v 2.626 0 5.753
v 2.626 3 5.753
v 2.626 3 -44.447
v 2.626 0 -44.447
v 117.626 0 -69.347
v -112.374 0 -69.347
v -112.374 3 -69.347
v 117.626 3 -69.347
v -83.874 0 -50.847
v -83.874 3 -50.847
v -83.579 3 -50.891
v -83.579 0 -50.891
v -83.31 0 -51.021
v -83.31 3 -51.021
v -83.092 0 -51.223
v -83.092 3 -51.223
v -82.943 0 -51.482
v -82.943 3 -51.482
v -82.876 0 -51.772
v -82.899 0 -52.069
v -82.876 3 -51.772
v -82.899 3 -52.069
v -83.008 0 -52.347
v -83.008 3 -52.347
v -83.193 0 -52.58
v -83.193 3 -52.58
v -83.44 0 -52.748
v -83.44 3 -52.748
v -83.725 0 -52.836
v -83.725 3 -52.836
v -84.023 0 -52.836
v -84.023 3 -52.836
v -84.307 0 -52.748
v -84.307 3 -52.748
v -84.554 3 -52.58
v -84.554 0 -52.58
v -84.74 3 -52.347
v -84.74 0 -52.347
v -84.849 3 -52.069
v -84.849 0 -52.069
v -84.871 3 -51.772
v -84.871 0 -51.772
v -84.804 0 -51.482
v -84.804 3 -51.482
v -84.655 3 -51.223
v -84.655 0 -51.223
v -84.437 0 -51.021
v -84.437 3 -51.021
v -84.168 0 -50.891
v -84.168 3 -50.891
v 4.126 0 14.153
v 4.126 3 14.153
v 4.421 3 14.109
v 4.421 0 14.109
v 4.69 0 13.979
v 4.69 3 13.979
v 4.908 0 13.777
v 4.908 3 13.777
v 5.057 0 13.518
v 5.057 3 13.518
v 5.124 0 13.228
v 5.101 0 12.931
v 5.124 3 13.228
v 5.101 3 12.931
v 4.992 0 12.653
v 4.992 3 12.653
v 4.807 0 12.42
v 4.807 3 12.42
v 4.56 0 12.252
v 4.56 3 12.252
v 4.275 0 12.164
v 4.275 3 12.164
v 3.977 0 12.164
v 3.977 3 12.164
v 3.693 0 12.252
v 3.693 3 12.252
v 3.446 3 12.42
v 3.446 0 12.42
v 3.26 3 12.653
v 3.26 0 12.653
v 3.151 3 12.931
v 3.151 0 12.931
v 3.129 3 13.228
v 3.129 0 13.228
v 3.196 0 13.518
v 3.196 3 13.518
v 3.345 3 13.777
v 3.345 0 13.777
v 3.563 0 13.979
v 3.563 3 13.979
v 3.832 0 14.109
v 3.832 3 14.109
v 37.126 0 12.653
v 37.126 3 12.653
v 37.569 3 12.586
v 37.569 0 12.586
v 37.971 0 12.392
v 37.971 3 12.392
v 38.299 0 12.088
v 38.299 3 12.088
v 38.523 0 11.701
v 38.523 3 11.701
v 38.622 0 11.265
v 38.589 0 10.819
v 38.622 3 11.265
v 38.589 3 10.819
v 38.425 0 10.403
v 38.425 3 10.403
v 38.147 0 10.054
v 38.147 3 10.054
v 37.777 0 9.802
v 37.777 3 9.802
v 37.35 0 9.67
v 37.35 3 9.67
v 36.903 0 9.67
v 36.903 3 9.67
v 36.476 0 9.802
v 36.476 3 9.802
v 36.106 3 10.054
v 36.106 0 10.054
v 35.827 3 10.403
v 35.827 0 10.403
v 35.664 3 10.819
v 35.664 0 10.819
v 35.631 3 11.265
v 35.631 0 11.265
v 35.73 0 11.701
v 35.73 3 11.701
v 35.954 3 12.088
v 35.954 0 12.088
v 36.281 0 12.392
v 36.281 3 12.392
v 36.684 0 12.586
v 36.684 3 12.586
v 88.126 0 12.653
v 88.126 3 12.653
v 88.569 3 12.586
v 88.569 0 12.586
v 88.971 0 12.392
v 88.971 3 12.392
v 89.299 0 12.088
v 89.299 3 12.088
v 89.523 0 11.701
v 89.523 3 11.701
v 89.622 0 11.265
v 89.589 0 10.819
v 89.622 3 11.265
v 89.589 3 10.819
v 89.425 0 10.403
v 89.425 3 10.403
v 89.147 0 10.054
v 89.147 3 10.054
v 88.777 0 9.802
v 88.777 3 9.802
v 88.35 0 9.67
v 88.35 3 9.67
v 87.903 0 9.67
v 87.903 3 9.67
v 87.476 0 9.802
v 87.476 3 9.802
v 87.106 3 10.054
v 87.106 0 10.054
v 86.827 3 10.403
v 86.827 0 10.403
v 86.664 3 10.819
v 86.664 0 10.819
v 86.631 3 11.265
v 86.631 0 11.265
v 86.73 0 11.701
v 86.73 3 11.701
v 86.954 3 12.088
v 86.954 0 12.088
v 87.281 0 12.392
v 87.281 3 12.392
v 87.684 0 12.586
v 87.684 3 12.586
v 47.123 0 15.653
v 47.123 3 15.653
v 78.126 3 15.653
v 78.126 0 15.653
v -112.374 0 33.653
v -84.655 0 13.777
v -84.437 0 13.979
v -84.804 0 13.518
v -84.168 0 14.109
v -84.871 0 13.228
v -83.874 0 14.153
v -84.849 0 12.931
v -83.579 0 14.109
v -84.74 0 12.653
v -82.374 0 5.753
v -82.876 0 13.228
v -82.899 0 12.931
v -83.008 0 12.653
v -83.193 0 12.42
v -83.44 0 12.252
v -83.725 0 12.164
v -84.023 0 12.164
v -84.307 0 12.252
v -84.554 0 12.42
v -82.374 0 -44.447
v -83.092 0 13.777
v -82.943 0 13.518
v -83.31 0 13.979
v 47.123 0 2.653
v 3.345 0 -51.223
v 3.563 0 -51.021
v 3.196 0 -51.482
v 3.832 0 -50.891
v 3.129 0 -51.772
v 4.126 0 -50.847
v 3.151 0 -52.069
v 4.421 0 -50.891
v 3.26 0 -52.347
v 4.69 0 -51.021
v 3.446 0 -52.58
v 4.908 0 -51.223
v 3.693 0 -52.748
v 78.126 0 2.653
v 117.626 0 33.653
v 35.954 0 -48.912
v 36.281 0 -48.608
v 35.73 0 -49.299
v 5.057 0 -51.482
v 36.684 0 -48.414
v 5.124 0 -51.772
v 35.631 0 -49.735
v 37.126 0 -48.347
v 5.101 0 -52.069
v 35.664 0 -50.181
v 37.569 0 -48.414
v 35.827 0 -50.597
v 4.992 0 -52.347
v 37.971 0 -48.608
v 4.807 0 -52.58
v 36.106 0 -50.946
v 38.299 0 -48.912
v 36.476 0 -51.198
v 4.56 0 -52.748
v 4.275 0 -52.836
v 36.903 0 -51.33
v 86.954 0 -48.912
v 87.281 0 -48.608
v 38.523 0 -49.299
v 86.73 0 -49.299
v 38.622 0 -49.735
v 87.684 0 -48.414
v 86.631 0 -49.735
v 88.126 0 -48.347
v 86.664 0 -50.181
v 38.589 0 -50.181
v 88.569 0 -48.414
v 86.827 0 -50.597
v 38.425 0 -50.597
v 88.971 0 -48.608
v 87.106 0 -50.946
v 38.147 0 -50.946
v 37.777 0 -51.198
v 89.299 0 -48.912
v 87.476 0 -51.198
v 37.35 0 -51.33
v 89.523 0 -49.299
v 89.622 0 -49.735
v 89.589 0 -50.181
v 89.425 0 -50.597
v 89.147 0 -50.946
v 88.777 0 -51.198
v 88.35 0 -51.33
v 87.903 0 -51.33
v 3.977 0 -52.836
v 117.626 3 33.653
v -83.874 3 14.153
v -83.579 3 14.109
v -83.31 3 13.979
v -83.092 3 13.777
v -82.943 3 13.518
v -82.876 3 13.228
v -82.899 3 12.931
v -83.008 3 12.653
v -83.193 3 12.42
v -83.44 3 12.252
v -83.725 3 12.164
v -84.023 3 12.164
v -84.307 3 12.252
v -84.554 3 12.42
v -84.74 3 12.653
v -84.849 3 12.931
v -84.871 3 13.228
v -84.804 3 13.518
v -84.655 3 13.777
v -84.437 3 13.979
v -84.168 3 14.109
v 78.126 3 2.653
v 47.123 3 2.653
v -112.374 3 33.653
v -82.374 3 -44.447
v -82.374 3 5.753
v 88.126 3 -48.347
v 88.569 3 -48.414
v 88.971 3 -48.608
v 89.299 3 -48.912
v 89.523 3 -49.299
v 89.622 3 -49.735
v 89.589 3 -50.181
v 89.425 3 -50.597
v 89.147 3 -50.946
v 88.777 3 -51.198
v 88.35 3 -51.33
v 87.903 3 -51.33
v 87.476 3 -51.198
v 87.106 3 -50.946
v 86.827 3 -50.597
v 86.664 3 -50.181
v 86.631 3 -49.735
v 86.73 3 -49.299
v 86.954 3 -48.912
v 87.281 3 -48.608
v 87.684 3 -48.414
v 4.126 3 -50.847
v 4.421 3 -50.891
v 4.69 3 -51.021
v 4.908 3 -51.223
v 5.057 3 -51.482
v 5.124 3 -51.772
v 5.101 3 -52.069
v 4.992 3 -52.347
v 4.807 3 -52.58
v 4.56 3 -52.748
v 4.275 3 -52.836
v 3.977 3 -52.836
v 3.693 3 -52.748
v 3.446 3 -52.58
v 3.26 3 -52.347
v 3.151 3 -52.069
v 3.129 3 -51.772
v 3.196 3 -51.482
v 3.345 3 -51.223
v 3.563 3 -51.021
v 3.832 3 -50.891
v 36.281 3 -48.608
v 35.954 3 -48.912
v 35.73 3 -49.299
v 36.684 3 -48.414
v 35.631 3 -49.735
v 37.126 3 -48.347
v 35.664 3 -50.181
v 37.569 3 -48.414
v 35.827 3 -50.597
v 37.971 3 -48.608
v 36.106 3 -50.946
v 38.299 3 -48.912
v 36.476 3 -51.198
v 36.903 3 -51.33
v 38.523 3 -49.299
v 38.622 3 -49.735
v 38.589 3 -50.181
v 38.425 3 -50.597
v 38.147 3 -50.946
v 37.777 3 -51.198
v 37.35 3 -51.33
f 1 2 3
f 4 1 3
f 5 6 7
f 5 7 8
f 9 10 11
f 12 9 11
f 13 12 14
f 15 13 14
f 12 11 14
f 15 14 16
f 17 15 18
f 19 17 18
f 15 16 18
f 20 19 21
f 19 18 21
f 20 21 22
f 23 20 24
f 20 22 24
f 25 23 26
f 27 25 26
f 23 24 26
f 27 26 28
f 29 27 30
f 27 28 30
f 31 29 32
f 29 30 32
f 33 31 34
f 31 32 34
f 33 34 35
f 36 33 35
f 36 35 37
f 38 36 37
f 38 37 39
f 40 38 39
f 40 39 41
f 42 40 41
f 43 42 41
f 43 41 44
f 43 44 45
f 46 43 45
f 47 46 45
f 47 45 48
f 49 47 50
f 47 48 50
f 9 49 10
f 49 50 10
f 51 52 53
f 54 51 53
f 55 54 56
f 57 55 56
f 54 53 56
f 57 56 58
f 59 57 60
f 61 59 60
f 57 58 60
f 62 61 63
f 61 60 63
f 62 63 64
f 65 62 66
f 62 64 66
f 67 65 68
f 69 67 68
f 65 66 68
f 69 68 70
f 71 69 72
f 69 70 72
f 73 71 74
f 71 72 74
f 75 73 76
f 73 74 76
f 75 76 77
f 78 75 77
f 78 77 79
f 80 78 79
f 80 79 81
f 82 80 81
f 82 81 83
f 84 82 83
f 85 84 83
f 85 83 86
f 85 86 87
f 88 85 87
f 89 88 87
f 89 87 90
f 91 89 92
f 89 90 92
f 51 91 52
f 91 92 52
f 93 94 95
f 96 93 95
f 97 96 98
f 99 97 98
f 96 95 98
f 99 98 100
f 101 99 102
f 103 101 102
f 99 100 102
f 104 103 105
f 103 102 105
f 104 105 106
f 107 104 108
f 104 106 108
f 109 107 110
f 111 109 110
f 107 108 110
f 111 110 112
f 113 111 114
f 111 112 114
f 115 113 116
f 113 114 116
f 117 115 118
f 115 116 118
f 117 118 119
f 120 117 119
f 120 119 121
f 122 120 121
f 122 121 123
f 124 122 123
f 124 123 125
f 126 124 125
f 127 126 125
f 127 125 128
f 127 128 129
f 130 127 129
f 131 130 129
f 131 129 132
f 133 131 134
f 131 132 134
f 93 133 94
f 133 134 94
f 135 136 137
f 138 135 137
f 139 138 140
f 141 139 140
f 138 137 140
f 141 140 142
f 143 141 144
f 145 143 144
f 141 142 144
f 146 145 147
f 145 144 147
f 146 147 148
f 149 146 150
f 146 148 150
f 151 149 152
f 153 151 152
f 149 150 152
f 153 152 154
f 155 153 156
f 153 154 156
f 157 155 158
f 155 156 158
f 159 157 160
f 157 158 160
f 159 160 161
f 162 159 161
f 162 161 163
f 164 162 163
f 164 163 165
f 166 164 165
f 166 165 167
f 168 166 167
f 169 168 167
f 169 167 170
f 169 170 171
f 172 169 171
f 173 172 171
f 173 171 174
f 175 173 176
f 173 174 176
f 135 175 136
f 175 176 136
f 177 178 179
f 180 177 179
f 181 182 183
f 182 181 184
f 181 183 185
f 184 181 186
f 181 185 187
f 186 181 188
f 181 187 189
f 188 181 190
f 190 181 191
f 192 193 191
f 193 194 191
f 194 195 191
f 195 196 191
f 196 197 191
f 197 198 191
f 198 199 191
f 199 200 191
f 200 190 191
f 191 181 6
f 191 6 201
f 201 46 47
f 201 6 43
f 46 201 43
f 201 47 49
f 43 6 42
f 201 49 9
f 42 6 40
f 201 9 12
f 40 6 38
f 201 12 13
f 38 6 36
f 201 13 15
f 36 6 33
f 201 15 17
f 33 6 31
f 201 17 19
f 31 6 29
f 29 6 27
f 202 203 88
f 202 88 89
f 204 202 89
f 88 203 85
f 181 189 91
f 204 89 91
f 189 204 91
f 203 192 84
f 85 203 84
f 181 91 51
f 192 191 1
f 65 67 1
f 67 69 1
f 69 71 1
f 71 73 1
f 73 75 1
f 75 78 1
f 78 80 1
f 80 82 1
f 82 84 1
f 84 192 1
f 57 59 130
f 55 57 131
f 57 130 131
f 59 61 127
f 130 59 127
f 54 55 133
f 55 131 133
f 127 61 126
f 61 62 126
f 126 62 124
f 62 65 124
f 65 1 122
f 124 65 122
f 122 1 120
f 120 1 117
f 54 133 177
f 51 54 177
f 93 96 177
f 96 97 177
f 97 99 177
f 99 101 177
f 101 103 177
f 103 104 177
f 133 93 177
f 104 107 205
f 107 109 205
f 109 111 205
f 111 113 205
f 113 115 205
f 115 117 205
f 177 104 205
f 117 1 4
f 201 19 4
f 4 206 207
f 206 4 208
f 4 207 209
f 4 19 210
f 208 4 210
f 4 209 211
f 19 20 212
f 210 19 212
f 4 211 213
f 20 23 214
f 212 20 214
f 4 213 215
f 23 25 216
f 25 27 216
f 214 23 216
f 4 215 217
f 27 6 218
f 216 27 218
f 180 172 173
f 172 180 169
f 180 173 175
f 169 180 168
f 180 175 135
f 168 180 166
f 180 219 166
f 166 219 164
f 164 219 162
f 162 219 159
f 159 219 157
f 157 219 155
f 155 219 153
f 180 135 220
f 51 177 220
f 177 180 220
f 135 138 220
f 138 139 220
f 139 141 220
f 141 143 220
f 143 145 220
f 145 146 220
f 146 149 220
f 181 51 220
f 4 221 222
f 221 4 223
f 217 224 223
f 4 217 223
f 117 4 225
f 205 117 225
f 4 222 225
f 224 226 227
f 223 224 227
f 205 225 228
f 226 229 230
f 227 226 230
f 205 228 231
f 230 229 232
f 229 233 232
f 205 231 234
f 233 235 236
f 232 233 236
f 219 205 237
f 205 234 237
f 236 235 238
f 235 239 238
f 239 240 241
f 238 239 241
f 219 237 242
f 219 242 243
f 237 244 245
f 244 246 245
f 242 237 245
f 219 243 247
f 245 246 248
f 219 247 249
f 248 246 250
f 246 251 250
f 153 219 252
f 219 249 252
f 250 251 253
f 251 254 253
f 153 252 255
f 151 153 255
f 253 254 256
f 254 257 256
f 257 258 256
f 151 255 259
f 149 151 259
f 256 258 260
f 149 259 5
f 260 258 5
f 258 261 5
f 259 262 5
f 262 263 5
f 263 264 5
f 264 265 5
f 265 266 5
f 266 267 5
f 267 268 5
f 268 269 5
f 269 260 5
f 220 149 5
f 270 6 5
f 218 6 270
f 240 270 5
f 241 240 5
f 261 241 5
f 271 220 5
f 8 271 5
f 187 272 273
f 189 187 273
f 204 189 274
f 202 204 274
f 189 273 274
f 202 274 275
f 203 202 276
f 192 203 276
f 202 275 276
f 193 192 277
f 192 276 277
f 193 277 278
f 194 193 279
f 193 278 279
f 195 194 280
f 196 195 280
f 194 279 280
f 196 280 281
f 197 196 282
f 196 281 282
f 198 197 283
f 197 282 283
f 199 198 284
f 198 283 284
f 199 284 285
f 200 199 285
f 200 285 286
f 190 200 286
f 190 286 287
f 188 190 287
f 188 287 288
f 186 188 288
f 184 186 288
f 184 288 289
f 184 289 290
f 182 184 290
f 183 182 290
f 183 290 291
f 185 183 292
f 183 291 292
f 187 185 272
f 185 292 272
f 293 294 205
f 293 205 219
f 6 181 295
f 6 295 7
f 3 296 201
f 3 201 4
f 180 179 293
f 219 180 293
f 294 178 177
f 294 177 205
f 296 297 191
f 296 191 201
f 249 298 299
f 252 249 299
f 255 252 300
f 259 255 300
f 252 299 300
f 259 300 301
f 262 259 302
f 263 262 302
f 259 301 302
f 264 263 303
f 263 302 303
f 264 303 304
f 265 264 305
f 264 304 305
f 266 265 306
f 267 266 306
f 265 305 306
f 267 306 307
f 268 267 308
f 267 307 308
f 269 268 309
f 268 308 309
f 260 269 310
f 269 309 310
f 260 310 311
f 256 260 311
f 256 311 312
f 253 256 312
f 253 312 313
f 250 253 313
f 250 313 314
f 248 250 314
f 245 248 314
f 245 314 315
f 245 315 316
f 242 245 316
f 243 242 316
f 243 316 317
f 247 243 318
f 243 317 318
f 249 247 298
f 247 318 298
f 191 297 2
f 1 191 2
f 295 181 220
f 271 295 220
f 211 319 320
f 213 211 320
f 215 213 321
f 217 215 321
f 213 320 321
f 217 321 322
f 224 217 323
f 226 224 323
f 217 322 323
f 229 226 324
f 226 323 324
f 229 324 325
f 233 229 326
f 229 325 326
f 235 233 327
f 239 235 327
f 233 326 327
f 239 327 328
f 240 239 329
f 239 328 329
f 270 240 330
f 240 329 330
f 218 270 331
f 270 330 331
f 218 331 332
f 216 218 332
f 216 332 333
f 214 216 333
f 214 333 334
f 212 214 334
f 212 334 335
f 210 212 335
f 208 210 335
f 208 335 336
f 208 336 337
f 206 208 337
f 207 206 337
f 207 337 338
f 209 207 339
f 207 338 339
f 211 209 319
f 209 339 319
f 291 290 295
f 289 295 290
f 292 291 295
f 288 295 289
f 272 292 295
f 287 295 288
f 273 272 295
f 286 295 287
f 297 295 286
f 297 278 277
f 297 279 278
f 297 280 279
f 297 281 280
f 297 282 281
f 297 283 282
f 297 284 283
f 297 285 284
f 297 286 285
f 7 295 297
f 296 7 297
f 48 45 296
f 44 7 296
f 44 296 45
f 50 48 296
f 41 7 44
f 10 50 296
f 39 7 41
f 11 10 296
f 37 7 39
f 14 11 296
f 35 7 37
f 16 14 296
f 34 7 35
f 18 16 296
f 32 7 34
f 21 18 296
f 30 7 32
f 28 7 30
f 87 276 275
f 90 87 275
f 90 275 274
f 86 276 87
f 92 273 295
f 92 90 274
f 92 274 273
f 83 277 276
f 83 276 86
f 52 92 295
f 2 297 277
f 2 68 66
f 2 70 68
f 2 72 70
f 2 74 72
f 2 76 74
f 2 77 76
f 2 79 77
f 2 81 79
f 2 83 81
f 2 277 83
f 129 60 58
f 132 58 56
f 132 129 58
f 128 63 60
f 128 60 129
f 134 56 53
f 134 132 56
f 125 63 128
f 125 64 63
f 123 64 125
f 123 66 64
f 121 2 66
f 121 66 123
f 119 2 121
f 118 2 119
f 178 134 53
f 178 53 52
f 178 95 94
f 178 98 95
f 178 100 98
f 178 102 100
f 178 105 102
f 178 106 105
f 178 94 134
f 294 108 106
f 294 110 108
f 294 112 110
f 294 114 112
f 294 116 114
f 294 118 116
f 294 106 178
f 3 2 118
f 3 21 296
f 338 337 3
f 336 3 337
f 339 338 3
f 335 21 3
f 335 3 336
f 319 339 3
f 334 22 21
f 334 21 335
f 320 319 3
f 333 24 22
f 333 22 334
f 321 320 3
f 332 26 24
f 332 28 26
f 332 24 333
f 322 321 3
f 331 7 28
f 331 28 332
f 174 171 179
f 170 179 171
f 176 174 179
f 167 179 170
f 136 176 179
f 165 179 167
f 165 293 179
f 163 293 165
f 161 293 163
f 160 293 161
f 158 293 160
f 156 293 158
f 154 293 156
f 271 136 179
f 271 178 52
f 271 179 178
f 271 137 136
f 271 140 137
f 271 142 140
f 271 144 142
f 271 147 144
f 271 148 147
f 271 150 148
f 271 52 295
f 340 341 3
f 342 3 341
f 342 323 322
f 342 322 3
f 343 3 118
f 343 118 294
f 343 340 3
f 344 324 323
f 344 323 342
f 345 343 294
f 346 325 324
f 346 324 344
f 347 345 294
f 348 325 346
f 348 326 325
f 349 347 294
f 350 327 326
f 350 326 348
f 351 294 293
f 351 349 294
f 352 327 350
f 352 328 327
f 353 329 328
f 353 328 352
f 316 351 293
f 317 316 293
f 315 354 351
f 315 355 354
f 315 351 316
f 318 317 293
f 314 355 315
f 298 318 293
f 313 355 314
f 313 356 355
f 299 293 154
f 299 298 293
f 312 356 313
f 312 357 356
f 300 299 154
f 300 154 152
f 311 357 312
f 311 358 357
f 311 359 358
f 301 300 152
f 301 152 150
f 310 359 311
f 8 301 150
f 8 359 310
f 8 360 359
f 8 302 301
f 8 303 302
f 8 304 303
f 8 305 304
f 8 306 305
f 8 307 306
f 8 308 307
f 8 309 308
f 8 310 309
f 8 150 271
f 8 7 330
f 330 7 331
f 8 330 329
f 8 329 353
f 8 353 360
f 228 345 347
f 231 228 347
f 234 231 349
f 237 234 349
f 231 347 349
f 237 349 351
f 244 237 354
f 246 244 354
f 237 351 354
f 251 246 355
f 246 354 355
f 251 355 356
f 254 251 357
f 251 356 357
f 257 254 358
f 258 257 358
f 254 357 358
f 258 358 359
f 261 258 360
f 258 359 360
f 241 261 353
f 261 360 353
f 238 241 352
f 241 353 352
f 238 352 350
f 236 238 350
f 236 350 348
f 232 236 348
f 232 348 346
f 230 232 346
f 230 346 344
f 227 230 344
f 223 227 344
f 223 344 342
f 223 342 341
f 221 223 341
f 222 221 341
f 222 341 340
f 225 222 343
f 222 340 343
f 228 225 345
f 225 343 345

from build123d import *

# Parameters (mm, degrees)
SKETCH1_W           = 230
SKETCH1_H           = 103
BOSS_EXTRUDE1_DEPTH = 3
SKETCH2_W           = 85
SKETCH2_H           = 50.2
CUT_EXTRUDE1_DEPTH  = 3
SKETCH3_R           = 1.5
SKETCH3_W           = 31.00355617
SKETCH3_H           = 13
CUT_EXTRUDE2_DEPTH  = 3
SKETCH4_R           = 1
CUT_EXTRUDE3_DEPTH  = 3


with BuildPart() as part:
    # Sketch1 → Boss-Extrude1 (new body)
    with BuildSketch(Plane(origin=(0, 0, 0), x_dir=(1, 0, 0), z_dir=(0, 1, 0))):
        with Locations((2.626404494, 17.846910112)):
            Rectangle(SKETCH1_W, SKETCH1_H)
    extrude(amount=BOSS_EXTRUDE1_DEPTH)

    # Sketch2 → Cut-Extrude1 (cut)
    with BuildSketch(Plane(origin=(0, 3, 0), x_dir=(1, 0, 0), z_dir=(0, 1, 0))):
        with Locations((-39.873595506, 19.346910112)):
            Rectangle(SKETCH2_W, SKETCH2_H)
    extrude(amount=-CUT_EXTRUDE1_DEPTH, mode=Mode.SUBTRACT)

    # Sketch3 → Cut-Extrude2 (cut)
    with BuildSketch(Plane(origin=(0, 3, 0), x_dir=(1, 0, 0), z_dir=(0, 1, 0))):
        with Locations(Location((37.126404494, 49.846910112, 0), (0, 0, 270))):
            Circle(SKETCH3_R)
        with Locations(Location((88.126404494, 49.846910112, 0), (0, 0, 270))):
            Circle(SKETCH3_R)
        with Locations(Location((88.126404494, -11.153089888, 0), (0, 0, 270))):
            Circle(SKETCH3_R)
        with Locations(Location((37.126404494, -11.153089888, 0), (0, 0, 270))):
            Circle(SKETCH3_R)
        with Locations((62.624626409, -9.153089888)):
            Rectangle(SKETCH3_W, SKETCH3_H)
    extrude(amount=-CUT_EXTRUDE2_DEPTH, mode=Mode.SUBTRACT)

    # Sketch4 → Cut-Extrude3 (cut)
    with BuildSketch(Plane(origin=(0, 3, 0), x_dir=(1, 0, 0), z_dir=(0, 1, 0))):
        with Locations(Location((-83.873595506, 51.846910112, 0), (0, 0, 270))):
            Circle(SKETCH4_R)
        with Locations(Location((4.126404494, 51.846910112, 0), (0, 0, 270))):
            Circle(SKETCH4_R)
        with Locations(Location((-83.873595506, -13.153089888, 0), (0, 0, 270))):
            Circle(SKETCH4_R)
        with Locations(Location((4.126404494, -13.153089888, 0), (0, 0, 270))):
            Circle(SKETCH4_R)
    extrude(amount=-CUT_EXTRUDE3_DEPTH, mode=Mode.SUBTRACT)


solid = part.part
